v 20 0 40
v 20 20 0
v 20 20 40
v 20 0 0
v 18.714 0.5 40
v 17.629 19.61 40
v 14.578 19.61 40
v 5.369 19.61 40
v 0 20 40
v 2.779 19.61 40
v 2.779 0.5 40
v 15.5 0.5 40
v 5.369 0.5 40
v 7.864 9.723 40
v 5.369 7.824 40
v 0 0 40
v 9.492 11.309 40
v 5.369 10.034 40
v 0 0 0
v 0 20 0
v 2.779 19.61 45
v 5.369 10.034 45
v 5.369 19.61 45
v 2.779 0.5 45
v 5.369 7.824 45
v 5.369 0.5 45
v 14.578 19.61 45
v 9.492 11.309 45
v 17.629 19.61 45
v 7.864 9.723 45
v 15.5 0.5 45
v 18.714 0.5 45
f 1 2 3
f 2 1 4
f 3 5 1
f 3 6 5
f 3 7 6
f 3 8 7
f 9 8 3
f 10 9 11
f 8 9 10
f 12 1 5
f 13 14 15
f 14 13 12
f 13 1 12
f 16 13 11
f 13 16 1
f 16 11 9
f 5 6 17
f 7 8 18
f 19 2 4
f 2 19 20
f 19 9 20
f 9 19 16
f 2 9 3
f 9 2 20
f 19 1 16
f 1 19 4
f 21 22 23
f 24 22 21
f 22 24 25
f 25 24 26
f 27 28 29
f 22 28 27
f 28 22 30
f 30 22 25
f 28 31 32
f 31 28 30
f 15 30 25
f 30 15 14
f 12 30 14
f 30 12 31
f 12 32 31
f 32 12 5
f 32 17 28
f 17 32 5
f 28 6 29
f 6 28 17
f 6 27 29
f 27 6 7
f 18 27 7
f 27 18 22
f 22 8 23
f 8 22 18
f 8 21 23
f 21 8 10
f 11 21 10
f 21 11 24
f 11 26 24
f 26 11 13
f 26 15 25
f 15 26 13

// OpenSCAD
cube([20, 20, 40]);
translate([0.5, 0.5, 40]){
    linear_extrude(5){
        text("K", size=20);
    }
}
